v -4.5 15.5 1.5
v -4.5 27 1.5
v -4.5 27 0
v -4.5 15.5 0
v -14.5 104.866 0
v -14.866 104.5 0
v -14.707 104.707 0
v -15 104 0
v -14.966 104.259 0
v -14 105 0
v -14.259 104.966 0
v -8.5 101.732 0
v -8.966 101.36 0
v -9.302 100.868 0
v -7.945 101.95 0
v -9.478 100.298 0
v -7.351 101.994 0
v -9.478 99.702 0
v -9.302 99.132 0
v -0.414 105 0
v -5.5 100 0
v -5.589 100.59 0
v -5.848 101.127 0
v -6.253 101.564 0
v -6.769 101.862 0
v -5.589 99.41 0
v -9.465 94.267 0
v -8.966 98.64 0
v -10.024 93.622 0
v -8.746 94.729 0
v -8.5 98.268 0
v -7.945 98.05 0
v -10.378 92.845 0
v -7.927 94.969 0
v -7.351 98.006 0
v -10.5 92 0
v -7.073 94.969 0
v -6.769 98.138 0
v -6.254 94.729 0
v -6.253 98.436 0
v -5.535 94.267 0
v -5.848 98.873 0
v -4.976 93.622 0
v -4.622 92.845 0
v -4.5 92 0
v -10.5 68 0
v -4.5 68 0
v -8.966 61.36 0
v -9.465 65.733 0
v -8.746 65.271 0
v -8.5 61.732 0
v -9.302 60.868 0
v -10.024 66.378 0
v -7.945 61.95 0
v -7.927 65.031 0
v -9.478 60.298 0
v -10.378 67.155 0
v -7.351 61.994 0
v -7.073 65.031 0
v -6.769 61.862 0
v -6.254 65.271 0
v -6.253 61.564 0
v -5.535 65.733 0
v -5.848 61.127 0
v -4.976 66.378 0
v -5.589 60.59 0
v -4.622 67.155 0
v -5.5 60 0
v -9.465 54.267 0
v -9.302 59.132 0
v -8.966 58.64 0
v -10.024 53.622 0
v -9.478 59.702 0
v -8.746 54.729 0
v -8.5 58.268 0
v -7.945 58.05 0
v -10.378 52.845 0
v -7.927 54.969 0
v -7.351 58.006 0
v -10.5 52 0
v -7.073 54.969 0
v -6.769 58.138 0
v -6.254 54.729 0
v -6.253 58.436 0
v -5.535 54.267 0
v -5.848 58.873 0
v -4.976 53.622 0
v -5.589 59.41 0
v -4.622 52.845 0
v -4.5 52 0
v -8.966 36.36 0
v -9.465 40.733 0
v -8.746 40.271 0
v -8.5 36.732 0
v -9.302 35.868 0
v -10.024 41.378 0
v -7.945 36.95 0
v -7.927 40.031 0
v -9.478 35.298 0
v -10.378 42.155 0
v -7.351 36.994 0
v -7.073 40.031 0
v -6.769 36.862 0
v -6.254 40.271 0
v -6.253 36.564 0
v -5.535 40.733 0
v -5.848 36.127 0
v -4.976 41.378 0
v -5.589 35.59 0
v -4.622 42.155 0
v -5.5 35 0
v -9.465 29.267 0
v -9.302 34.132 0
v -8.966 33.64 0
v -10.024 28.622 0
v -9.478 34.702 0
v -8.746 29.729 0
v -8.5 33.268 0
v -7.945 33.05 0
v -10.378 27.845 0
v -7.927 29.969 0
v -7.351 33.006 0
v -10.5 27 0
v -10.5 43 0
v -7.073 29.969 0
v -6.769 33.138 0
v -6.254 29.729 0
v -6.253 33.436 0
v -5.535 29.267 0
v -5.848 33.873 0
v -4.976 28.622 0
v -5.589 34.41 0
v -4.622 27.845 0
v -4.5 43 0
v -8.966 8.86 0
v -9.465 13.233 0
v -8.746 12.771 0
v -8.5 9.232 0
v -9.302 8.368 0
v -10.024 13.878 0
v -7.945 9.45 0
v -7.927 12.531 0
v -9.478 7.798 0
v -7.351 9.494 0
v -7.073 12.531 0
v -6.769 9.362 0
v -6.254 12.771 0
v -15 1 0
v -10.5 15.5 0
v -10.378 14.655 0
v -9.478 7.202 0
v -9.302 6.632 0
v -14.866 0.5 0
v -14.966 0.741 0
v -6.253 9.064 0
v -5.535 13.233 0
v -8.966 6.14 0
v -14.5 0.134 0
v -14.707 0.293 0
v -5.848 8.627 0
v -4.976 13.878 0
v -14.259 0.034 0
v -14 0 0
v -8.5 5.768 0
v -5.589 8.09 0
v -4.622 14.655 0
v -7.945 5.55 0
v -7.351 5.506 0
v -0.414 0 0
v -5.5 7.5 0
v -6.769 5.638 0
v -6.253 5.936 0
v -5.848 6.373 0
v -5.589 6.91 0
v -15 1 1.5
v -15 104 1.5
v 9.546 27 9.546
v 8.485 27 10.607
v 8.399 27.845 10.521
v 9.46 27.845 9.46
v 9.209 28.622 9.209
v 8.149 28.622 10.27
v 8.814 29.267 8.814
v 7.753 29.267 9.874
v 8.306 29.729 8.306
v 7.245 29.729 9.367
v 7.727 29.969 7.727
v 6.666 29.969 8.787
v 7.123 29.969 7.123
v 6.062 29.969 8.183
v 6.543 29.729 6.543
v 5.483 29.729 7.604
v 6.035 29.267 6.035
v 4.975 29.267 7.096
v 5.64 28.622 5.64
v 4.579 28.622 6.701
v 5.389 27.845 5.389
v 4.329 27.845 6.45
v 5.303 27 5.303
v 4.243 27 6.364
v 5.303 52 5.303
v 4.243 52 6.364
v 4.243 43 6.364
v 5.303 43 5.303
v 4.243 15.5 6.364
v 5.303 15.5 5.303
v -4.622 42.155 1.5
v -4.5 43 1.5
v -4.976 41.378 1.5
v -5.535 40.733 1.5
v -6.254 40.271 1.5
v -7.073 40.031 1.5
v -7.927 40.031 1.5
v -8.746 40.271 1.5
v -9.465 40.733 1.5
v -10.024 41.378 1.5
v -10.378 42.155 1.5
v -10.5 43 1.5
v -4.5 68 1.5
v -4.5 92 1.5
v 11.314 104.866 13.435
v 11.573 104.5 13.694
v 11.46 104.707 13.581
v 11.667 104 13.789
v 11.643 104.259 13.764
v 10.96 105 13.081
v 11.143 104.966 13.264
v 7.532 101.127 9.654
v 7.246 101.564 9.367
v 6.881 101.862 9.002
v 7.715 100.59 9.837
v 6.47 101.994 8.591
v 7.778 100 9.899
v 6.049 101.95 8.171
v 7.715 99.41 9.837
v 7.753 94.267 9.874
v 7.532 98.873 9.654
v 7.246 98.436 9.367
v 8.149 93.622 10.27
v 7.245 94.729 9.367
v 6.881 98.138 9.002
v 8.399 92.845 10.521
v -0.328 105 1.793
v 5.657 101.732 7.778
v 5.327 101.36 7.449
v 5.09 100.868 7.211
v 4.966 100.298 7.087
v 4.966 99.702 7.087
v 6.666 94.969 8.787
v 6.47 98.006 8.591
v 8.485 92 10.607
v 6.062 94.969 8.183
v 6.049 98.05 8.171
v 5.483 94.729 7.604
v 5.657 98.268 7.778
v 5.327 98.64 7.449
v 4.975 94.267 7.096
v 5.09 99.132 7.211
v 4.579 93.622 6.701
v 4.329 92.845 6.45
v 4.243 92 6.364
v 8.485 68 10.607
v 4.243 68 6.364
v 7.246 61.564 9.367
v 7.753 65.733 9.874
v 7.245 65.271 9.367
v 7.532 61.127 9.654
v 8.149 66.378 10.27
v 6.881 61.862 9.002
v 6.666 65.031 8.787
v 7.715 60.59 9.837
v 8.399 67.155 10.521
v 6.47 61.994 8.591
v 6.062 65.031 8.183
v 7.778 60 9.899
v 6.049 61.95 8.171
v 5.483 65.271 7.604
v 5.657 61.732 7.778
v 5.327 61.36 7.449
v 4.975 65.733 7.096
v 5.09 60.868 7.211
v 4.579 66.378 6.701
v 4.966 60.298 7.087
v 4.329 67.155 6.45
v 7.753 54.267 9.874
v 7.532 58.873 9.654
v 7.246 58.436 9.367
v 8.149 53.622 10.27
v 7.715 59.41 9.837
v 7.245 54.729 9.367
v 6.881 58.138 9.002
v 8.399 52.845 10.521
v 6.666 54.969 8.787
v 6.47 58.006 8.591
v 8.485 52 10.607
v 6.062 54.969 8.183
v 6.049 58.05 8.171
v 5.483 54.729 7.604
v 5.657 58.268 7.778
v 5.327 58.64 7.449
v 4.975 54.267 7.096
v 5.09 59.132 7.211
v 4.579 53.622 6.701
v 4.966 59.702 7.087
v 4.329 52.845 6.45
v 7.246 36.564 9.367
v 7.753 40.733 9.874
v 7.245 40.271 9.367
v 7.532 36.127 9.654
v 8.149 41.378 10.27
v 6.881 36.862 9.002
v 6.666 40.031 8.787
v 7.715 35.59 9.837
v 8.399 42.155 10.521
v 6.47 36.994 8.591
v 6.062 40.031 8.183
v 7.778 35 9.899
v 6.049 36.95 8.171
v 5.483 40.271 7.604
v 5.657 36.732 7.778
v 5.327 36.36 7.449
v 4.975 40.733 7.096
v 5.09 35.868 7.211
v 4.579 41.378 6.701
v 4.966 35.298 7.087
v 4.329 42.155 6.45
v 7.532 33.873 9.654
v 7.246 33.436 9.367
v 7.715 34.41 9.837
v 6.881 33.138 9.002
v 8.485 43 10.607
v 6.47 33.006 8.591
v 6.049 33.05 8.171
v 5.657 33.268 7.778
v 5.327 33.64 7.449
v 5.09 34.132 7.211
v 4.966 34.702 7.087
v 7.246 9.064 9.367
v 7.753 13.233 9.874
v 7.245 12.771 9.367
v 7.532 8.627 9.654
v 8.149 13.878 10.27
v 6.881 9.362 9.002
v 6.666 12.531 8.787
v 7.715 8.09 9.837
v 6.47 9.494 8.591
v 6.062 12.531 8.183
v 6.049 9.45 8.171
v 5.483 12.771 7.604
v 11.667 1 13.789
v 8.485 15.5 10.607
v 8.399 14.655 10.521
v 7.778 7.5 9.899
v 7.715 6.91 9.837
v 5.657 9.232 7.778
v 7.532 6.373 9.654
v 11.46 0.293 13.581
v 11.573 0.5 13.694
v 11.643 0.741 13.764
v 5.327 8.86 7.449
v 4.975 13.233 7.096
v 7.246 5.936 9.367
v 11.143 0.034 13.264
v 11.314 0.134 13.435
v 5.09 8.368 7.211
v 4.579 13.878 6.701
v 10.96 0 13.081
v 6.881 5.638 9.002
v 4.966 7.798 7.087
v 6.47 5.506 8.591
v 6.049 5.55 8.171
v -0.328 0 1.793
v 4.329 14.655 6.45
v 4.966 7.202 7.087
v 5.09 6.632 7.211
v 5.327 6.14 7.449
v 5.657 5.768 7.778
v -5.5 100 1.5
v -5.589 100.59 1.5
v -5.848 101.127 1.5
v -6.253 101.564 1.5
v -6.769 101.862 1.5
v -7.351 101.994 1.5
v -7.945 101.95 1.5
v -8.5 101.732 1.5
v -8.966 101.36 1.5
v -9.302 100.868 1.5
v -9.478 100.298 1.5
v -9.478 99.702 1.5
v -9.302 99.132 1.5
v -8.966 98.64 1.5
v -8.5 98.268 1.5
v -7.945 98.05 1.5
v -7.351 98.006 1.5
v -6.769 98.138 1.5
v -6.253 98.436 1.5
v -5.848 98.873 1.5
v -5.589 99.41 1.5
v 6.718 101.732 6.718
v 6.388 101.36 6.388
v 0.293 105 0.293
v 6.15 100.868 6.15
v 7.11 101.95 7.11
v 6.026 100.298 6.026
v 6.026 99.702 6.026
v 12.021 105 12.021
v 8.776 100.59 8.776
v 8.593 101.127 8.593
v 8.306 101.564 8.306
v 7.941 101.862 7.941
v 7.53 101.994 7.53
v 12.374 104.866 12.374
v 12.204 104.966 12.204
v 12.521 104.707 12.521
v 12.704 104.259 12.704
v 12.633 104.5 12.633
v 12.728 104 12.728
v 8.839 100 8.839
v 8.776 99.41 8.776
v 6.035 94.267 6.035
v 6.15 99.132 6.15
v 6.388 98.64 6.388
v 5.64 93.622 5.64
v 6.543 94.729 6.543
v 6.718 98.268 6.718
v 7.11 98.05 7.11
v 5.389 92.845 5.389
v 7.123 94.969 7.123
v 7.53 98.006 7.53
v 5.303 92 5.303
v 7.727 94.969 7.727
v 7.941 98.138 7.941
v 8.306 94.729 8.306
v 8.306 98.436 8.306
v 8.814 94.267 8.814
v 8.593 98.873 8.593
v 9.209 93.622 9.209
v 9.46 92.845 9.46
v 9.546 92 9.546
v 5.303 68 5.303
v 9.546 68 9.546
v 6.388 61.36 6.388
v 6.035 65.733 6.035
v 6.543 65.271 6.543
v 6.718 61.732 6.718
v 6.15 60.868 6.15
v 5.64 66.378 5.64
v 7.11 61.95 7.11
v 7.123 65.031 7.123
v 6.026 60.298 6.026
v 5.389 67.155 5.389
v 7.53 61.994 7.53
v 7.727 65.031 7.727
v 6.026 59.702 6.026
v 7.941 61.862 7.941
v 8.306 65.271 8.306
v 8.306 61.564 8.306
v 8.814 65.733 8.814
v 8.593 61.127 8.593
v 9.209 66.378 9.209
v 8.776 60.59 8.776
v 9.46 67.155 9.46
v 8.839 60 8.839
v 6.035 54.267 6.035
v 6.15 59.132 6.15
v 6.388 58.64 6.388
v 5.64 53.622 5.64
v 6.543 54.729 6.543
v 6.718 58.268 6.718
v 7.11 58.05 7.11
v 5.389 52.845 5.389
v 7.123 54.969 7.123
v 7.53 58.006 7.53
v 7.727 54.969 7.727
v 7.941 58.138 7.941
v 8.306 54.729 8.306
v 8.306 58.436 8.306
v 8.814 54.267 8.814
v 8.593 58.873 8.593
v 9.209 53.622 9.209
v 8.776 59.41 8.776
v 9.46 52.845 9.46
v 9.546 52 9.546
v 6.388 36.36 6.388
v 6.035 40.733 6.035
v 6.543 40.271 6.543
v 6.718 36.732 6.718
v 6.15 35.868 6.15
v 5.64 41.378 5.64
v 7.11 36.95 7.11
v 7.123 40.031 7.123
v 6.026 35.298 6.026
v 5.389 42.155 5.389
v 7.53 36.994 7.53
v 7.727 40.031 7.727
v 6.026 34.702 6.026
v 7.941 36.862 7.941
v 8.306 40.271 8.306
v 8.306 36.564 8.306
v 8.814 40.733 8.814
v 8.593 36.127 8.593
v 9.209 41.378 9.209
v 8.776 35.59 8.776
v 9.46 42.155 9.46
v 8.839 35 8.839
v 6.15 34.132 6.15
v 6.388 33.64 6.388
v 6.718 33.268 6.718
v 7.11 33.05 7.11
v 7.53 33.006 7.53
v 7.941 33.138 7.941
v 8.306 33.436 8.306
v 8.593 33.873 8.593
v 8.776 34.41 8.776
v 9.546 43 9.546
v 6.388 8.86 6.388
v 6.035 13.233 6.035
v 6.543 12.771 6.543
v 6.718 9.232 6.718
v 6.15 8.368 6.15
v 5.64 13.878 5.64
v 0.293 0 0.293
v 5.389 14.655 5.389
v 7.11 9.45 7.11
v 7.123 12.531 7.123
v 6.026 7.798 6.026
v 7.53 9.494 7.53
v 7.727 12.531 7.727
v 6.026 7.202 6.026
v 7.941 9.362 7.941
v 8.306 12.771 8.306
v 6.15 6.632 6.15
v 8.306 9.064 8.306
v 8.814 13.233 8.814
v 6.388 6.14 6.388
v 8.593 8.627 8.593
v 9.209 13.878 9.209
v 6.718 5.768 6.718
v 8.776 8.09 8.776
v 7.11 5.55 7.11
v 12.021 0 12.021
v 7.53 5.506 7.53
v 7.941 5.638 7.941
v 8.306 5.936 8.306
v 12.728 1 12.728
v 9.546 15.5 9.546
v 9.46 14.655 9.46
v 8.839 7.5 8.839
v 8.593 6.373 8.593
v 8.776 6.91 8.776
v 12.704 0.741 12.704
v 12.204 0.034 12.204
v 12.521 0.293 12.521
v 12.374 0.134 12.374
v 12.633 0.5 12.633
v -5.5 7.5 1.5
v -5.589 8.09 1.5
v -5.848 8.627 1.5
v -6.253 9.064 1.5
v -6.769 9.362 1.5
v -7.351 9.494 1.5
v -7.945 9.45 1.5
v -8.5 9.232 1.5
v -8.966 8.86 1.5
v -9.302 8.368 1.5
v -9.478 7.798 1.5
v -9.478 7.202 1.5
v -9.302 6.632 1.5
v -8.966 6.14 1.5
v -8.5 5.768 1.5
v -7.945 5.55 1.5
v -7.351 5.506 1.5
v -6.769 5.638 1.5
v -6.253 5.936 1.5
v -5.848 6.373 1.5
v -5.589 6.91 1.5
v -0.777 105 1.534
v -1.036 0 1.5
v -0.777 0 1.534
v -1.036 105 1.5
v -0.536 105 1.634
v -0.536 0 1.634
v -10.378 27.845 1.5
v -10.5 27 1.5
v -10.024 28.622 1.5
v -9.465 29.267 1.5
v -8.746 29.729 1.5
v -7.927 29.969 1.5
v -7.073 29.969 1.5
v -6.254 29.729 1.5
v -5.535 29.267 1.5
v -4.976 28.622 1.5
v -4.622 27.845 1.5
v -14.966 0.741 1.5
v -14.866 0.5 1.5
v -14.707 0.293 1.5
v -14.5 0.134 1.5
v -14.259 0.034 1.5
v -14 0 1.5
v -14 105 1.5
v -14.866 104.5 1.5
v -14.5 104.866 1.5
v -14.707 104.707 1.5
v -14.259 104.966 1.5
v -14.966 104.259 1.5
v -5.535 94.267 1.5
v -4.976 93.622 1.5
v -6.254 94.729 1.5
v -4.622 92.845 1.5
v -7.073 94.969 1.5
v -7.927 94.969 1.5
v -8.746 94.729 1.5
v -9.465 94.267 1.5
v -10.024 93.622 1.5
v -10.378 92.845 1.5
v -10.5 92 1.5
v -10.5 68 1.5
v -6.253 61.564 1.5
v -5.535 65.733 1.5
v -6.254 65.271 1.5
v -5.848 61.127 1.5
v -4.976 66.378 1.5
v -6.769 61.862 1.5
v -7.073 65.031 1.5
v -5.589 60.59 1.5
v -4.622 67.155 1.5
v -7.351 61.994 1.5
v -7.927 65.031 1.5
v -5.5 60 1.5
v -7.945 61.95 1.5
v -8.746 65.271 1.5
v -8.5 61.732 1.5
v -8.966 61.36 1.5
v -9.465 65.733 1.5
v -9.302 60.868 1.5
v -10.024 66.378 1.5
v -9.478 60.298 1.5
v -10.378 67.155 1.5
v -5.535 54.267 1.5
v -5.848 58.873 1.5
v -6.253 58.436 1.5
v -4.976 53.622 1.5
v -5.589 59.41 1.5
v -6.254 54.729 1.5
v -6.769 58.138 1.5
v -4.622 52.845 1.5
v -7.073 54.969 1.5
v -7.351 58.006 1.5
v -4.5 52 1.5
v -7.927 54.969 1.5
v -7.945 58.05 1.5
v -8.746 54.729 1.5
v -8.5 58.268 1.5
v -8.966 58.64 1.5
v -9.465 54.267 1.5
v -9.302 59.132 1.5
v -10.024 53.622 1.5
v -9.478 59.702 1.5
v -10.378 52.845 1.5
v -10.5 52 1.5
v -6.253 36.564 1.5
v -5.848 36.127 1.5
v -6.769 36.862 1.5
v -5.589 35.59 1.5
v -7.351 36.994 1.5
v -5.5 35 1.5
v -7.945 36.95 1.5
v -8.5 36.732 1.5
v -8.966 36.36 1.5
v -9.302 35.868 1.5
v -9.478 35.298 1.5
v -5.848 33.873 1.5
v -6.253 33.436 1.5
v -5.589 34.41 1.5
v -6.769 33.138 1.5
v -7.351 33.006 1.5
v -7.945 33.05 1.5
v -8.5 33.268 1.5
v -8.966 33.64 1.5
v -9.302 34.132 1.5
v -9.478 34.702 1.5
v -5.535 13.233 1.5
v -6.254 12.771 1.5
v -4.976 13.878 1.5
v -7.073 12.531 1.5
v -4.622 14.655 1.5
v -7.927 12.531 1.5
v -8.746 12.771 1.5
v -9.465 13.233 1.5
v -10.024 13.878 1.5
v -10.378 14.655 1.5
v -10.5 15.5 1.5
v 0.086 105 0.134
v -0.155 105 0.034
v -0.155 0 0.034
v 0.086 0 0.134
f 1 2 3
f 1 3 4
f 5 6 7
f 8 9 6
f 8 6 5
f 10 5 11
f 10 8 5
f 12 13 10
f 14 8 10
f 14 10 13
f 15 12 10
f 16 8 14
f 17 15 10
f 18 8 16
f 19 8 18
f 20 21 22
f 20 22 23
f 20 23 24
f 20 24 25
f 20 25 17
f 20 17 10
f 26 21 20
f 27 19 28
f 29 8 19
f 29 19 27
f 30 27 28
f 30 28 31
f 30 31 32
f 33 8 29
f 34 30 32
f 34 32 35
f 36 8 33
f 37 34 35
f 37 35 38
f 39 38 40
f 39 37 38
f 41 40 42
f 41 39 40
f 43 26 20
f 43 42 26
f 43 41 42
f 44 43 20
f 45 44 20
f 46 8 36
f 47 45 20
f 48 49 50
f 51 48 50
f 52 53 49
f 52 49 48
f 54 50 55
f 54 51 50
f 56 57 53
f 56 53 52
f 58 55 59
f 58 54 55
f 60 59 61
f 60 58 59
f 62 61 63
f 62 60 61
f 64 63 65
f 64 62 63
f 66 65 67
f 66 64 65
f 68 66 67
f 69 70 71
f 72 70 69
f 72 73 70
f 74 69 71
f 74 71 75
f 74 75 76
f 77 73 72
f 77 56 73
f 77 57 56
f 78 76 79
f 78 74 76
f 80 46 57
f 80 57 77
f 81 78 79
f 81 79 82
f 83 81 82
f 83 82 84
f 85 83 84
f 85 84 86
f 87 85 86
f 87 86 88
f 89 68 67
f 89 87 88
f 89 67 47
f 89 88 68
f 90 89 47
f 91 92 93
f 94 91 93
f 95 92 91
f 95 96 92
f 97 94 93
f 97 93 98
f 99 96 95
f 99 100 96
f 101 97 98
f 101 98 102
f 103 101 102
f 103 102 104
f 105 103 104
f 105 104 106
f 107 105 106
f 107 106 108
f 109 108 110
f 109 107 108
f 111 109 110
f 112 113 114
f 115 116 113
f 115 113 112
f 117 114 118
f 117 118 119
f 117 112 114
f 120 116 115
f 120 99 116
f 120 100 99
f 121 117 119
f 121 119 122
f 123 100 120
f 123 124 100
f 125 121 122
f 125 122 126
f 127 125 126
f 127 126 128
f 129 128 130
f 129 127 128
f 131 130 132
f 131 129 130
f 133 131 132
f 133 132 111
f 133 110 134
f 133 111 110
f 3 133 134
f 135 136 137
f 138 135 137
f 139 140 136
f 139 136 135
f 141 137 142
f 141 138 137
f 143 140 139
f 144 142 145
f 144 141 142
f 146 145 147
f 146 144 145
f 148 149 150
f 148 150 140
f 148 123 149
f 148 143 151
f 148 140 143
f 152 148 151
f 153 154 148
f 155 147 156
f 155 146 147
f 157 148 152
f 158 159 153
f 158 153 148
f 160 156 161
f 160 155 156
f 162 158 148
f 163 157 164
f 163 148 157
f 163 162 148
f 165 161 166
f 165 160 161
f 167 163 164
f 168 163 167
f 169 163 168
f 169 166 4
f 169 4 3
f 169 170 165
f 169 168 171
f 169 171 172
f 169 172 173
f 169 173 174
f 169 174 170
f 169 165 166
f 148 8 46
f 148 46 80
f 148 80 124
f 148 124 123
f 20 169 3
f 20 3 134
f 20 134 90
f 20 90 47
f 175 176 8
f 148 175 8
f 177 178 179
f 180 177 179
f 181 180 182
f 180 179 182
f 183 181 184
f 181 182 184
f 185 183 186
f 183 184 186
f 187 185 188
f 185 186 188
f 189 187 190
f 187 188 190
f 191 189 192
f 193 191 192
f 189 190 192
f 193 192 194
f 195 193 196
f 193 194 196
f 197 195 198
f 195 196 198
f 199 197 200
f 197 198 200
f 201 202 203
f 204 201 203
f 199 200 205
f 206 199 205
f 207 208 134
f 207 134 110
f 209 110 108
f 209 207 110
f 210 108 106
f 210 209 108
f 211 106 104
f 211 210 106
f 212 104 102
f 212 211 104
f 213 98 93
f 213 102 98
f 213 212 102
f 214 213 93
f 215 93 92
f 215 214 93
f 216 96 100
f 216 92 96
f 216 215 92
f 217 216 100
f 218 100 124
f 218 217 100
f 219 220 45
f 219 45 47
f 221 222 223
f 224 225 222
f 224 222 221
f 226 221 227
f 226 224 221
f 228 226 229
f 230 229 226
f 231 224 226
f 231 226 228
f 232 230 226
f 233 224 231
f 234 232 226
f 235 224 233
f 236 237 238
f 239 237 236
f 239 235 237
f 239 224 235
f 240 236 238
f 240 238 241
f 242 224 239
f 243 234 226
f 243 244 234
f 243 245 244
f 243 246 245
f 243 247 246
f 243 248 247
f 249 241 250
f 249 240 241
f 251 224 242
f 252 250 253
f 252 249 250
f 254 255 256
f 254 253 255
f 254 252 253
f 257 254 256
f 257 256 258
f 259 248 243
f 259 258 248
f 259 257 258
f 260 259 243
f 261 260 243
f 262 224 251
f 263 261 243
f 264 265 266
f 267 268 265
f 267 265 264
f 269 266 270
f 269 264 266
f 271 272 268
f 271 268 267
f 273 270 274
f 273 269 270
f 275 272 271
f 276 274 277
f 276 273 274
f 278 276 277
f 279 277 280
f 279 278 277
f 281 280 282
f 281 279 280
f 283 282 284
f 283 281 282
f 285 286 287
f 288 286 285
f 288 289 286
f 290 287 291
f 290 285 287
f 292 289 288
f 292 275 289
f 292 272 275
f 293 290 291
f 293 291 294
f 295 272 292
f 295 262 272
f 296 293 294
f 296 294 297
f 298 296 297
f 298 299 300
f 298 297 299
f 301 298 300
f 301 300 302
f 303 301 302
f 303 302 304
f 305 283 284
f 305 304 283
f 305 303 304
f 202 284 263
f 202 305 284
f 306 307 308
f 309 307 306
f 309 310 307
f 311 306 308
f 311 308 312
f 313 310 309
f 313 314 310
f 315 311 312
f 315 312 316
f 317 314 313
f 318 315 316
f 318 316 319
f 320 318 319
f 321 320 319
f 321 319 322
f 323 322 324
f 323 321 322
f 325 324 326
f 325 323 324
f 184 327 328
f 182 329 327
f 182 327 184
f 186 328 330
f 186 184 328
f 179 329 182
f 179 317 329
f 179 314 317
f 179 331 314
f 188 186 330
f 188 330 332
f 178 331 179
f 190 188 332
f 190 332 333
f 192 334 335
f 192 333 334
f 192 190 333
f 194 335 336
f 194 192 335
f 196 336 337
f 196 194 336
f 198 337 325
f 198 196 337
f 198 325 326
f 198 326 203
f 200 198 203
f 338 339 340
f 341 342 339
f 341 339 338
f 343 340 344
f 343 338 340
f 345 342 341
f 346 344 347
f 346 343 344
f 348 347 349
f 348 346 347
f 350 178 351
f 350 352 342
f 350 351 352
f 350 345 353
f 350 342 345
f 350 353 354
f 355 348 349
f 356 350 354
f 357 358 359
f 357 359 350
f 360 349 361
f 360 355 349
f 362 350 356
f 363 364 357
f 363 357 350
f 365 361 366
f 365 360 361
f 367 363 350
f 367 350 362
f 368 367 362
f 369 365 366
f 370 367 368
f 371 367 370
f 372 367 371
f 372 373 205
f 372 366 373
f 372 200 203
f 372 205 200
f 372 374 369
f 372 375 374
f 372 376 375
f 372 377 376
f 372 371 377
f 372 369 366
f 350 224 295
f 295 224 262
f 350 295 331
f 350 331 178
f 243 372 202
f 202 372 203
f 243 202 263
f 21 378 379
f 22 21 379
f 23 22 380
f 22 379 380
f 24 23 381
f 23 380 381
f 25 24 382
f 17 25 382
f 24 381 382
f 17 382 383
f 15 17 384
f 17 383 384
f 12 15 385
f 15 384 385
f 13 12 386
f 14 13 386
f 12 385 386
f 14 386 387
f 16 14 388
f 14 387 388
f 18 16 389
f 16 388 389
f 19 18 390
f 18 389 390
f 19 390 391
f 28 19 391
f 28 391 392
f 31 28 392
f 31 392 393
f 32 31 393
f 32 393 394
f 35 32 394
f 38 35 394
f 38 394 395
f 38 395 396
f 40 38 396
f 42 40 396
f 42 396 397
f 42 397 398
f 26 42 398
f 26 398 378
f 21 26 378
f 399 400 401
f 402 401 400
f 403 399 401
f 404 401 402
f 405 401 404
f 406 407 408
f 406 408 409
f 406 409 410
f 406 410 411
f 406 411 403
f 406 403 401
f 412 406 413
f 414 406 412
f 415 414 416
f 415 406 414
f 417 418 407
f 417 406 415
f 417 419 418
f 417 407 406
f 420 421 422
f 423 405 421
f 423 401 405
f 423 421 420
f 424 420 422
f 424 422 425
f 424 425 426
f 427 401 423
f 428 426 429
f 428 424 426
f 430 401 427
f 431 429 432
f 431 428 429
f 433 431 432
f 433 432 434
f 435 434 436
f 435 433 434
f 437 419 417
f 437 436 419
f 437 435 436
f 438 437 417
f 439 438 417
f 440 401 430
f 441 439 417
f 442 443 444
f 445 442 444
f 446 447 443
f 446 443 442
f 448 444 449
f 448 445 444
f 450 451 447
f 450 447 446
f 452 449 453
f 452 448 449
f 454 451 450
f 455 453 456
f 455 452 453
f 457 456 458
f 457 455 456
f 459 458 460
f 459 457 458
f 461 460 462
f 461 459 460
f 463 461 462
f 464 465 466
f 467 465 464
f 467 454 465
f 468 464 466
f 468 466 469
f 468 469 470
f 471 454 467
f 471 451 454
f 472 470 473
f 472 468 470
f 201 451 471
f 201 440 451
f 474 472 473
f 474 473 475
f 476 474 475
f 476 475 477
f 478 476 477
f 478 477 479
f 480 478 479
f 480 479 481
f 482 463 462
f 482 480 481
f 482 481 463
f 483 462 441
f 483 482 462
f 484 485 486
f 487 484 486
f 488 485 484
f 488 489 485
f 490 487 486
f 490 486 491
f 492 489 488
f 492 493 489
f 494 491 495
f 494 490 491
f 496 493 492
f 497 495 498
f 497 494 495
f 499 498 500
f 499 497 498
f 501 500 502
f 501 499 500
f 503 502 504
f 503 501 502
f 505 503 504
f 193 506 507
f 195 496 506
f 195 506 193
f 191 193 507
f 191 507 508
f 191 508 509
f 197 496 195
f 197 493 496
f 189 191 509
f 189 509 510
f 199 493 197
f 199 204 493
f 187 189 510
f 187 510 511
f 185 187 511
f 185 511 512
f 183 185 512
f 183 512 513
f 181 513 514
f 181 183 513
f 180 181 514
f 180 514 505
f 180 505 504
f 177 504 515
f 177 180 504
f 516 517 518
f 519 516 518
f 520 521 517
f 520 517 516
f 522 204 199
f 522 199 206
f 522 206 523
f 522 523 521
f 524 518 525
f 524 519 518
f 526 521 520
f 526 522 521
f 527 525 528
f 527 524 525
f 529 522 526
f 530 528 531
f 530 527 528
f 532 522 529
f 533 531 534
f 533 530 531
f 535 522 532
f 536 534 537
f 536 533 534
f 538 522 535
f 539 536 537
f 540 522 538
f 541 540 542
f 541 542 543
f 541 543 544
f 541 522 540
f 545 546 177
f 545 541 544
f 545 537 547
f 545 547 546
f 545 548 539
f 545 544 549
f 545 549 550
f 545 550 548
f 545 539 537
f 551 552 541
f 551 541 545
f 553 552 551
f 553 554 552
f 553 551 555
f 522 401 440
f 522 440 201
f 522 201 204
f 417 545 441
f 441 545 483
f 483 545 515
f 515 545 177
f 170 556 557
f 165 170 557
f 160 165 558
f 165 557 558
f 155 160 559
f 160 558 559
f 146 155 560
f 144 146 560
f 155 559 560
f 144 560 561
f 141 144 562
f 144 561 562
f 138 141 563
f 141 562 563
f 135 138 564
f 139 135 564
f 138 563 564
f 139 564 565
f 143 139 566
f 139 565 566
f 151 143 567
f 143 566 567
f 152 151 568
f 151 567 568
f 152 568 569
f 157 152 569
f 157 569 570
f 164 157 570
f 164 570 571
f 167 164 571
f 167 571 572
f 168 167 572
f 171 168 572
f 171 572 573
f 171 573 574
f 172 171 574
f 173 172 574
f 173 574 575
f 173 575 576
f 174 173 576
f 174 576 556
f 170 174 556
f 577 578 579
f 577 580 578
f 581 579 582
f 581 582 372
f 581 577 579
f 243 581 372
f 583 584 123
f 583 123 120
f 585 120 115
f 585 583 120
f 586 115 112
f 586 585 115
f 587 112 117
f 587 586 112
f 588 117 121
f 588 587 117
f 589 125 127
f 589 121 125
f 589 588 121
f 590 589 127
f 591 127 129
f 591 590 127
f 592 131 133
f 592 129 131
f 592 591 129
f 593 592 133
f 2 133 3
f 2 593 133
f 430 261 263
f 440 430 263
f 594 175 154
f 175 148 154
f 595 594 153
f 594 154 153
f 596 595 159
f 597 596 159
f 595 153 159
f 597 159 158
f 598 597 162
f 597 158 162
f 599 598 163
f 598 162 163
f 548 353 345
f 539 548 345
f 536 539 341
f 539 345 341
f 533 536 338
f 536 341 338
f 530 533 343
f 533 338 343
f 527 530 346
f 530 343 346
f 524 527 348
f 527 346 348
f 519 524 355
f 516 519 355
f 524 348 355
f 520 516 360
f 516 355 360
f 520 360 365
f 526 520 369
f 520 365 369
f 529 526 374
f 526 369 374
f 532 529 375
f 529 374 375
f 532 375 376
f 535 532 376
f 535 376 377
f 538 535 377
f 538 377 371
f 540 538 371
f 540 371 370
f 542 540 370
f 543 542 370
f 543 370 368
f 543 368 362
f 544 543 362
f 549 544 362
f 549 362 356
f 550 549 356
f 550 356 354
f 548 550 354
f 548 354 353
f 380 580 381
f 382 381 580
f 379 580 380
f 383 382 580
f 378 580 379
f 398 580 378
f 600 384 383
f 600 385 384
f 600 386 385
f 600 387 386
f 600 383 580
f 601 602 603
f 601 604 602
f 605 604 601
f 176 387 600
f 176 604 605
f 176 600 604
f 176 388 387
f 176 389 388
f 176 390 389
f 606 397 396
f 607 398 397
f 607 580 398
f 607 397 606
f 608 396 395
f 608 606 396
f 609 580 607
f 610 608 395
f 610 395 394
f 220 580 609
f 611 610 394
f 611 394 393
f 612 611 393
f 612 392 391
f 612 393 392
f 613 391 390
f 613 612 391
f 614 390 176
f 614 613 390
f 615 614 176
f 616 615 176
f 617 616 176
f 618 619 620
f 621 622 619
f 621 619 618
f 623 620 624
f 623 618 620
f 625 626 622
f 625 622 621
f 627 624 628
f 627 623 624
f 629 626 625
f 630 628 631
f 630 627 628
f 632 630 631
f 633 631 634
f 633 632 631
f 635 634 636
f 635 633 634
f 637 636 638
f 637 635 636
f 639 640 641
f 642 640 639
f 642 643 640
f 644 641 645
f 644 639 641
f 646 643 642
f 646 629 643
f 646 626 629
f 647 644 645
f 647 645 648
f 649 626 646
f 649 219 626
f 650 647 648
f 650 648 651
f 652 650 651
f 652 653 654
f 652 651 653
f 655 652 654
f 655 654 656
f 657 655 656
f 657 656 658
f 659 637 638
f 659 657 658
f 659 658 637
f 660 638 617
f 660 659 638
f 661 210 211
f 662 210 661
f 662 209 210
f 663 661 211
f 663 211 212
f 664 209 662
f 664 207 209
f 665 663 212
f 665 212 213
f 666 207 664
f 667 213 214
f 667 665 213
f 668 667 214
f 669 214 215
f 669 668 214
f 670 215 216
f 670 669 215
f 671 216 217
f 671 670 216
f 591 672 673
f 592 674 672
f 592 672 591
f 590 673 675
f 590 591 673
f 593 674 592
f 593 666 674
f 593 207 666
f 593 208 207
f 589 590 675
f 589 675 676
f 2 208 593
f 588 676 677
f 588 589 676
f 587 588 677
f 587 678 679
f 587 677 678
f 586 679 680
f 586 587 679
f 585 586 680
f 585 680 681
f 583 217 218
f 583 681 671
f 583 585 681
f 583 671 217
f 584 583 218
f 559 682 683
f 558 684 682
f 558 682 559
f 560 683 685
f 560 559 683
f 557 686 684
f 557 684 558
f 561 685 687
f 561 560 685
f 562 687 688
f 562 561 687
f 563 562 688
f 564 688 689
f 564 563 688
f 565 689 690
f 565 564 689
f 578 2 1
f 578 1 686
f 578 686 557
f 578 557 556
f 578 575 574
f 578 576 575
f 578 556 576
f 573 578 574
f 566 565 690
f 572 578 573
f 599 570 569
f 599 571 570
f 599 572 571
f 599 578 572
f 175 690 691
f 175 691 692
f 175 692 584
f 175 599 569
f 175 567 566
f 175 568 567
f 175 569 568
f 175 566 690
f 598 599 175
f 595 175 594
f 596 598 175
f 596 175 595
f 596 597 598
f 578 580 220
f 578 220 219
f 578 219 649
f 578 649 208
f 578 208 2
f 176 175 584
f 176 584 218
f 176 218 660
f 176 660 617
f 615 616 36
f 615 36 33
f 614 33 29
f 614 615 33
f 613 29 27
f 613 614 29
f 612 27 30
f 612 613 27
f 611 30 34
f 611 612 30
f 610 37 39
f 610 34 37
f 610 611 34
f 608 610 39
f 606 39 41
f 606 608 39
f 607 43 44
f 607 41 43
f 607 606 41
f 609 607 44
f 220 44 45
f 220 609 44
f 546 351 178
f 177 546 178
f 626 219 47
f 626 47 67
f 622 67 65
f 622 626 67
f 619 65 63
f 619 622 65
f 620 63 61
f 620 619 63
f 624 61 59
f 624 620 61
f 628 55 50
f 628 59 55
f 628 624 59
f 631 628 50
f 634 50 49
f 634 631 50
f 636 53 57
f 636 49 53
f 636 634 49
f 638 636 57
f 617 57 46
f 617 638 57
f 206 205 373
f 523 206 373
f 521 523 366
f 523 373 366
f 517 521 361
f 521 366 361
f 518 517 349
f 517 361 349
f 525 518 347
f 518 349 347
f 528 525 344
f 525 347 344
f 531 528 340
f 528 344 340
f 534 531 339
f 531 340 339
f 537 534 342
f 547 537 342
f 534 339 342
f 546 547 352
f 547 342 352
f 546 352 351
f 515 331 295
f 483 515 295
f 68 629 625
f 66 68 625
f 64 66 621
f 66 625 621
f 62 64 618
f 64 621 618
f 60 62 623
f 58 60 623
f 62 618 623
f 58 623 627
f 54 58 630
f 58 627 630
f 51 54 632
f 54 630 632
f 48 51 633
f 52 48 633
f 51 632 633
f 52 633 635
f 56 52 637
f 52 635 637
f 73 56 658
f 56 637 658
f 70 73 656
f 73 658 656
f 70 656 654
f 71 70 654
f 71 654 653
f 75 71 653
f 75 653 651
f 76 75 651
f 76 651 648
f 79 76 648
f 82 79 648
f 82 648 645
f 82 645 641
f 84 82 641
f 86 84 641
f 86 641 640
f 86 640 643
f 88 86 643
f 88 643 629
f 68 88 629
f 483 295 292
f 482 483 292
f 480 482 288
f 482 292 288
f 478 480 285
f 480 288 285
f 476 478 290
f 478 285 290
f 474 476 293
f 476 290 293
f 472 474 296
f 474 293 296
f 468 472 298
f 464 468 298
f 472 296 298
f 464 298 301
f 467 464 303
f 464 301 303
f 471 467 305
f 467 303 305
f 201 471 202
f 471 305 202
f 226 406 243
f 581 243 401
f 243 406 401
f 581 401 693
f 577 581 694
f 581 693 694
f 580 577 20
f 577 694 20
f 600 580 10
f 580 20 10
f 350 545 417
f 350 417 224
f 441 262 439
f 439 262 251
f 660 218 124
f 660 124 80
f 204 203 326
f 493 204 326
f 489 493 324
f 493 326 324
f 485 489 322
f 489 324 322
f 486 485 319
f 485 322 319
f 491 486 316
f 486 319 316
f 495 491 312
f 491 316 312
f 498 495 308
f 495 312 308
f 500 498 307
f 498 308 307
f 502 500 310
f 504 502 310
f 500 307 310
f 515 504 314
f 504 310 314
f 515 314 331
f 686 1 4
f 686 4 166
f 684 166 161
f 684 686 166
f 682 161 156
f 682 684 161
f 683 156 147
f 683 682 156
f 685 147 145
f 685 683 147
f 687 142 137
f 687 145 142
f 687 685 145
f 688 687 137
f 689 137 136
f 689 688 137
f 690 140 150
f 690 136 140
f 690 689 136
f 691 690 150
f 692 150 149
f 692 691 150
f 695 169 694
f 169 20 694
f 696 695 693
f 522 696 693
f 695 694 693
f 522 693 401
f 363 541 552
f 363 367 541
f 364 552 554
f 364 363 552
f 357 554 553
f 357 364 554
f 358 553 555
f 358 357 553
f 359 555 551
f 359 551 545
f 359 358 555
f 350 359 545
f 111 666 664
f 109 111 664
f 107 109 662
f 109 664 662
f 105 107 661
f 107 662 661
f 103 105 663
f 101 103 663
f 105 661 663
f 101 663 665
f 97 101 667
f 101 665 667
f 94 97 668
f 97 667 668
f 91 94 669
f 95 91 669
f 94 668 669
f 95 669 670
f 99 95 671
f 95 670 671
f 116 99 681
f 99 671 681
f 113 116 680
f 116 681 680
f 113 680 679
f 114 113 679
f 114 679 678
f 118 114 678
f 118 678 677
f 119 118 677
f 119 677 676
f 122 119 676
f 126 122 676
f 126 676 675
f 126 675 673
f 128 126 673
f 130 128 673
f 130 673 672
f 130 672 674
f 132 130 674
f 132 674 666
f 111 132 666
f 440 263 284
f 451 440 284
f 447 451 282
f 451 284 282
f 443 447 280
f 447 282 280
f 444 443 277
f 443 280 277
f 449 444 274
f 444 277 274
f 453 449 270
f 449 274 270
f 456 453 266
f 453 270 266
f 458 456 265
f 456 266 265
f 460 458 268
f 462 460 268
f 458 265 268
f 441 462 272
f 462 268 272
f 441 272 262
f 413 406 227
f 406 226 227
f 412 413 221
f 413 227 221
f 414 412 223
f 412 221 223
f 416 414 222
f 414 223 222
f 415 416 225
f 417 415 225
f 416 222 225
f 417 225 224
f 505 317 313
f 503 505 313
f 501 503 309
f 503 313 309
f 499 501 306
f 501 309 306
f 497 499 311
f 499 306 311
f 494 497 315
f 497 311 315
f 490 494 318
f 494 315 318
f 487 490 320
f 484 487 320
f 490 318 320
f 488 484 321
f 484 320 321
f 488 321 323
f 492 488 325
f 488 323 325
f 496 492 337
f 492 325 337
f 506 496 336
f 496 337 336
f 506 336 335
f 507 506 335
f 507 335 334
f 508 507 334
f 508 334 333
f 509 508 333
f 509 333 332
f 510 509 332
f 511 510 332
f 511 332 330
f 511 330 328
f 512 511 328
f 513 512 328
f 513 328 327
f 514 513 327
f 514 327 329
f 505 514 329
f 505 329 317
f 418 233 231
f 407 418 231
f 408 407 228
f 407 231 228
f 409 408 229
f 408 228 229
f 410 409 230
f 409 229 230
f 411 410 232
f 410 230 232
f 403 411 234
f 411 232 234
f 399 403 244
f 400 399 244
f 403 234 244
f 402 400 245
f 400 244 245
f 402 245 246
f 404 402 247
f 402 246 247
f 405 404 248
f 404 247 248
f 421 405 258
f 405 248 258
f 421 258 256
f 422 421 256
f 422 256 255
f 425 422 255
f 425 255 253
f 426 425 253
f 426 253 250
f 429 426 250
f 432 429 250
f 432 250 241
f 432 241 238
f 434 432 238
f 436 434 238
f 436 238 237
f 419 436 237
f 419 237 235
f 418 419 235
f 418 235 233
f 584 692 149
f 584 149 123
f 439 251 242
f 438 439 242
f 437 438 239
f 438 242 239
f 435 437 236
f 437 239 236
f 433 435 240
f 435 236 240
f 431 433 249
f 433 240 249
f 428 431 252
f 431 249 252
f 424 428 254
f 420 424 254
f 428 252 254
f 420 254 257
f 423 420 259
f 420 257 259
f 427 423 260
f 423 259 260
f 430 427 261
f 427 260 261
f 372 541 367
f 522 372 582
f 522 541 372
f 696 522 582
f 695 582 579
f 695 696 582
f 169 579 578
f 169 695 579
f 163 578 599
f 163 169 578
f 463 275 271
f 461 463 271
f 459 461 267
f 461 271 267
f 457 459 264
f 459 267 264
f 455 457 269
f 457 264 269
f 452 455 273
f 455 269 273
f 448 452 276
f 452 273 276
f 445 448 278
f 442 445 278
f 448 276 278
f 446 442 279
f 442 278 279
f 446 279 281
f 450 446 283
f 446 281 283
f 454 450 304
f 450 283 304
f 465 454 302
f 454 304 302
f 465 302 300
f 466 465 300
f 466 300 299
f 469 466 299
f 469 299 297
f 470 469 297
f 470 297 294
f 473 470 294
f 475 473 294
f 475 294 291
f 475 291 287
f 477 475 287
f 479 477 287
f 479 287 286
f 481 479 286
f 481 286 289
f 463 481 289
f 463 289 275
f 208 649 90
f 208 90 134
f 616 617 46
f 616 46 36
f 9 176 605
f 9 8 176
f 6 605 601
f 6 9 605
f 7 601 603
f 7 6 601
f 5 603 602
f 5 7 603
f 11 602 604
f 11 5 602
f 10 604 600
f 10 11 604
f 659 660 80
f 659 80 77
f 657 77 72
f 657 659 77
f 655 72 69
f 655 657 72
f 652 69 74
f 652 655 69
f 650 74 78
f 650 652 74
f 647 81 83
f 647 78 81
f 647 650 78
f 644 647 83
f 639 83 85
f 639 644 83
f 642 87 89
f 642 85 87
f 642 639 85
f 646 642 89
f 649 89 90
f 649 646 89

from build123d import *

# Parameters (mm, degrees)
EXTRUDE_1_DEPTH     = 105
SKETCH_2_R          = 2
CUT_EXTRUDE_1_DEPTH = 107.775508677
SKETCH_3_R          = 2
CUT_EXTRUDE_2_DEPTH = 110.207453302
FILLET_1_R          = 1


with BuildPart() as part:
    # 草图1 → 拉伸-薄壁1 (new body)
    with BuildSketch(Plane(origin=(0, 0, 0), x_dir=(1, 0, 0), z_dir=(0, 1, 0))):
        Polygon((-15, 0), (0, 0), (12.727922061, -12.727922061), (11.66726189, -13.788582233), (-0.621320344, -1.5), (-15, -1.5), align=None)
    extrude(amount=EXTRUDE_1_DEPTH)

    # 草图2 → 切除-拉伸1 (cut, through all)
    with BuildSketch(Plane.XY.offset(1.5)):
        with Locations((-7.5, 100)):
            Circle(SKETCH_2_R)
        with Locations((-7.5, 60)):
            Circle(SKETCH_2_R)
        with Locations((-7.5, 35)):
            Circle(SKETCH_2_R)
        with Locations((-7.5, 7.5)):
            Circle(SKETCH_2_R)
        with BuildLine():
            Line((-4.5, 92), (-4.5, 68))
            ThreePointArc((-4.5, 68), (-7.5, 65), (-10.5, 68))
            Line((-10.5, 68), (-10.5, 92))
            ThreePointArc((-10.5, 92), (-7.5, 95), (-4.5, 92))
        make_face()
        with BuildLine():
            Line((-4.5, 52), (-4.5, 43))
            ThreePointArc((-4.5, 43), (-7.5, 40), (-10.5, 43))
            Line((-10.5, 43), (-10.5, 52))
            ThreePointArc((-10.5, 52), (-7.5, 55), (-4.5, 52))
        make_face()
        with BuildLine():
            Line((-4.5, 27), (-4.5, 15.5))
            ThreePointArc((-4.5, 15.5), (-7.5, 12.5), (-10.5, 15.5))
            Line((-10.5, 15.5), (-10.5, 27))
            ThreePointArc((-10.5, 27), (-7.5, 30), (-4.5, 27))
        make_face()
    extrude(amount=-CUT_EXTRUDE_1_DEPTH, mode=Mode.SUBTRACT)

    # 草图3 → 切除-拉伸2 (cut, through all)
    with BuildSketch(Plane(origin=(11.66726189, 0, 13.788582233), x_dir=(0.7071067811865562, 0, 0.7071067811865389), z_dir=(-0.7071067811865389, 0, 0.7071067811865562))):
        with BuildLine():
            Line((-4.5, 68), (-4.5, 92))
            ThreePointArc((-4.5, 92), (-7.5, 95), (-10.5, 92))
            Line((-10.5, 92), (-10.5, 68))
            ThreePointArc((-10.5, 68), (-7.5, 65), (-4.5, 68))
        make_face()
        with BuildLine():
            Line((-4.5, 43), (-4.5, 52))
            ThreePointArc((-4.5, 52), (-7.5, 55), (-10.5, 52))
            Line((-10.5, 52), (-10.5, 43))
            ThreePointArc((-10.5, 43), (-7.5, 40), (-4.5, 43))
        make_face()
        with BuildLine():
            Line((-4.5, 15.5), (-4.5, 27))
            ThreePointArc((-4.5, 27), (-7.5, 30), (-10.5, 27))
            Line((-10.5, 27), (-10.5, 15.5))
            ThreePointArc((-10.5, 15.5), (-7.5, 12.5), (-4.5, 15.5))
        make_face()
        with Locations((-7.5, 100)):
            Circle(SKETCH_3_R)
        with Locations((-7.5, 60)):
            Circle(SKETCH_3_R)
        with Locations((-7.5, 35)):
            Circle(SKETCH_3_R)
        with Locations((-7.5, 7.5)):
            Circle(SKETCH_3_R)
    extrude(amount=-CUT_EXTRUDE_2_DEPTH, mode=Mode.SUBTRACT)

    # 圆角1
    fillet_1_edges = [part.edges().sort_by_distance(p)[0] for p in [
        (-15, 105, 0.75),
        (-15, 0, 0.75),
        (12.197591975, 0, 13.258252147),
        (12.197591975, 105, 13.258252147),
        (-0.621320344, 52.5, 1.5),
        (0, 52.5, 0),
    ]]
    fillet(fillet_1_edges, radius=FILLET_1_R)


solid = part.part
